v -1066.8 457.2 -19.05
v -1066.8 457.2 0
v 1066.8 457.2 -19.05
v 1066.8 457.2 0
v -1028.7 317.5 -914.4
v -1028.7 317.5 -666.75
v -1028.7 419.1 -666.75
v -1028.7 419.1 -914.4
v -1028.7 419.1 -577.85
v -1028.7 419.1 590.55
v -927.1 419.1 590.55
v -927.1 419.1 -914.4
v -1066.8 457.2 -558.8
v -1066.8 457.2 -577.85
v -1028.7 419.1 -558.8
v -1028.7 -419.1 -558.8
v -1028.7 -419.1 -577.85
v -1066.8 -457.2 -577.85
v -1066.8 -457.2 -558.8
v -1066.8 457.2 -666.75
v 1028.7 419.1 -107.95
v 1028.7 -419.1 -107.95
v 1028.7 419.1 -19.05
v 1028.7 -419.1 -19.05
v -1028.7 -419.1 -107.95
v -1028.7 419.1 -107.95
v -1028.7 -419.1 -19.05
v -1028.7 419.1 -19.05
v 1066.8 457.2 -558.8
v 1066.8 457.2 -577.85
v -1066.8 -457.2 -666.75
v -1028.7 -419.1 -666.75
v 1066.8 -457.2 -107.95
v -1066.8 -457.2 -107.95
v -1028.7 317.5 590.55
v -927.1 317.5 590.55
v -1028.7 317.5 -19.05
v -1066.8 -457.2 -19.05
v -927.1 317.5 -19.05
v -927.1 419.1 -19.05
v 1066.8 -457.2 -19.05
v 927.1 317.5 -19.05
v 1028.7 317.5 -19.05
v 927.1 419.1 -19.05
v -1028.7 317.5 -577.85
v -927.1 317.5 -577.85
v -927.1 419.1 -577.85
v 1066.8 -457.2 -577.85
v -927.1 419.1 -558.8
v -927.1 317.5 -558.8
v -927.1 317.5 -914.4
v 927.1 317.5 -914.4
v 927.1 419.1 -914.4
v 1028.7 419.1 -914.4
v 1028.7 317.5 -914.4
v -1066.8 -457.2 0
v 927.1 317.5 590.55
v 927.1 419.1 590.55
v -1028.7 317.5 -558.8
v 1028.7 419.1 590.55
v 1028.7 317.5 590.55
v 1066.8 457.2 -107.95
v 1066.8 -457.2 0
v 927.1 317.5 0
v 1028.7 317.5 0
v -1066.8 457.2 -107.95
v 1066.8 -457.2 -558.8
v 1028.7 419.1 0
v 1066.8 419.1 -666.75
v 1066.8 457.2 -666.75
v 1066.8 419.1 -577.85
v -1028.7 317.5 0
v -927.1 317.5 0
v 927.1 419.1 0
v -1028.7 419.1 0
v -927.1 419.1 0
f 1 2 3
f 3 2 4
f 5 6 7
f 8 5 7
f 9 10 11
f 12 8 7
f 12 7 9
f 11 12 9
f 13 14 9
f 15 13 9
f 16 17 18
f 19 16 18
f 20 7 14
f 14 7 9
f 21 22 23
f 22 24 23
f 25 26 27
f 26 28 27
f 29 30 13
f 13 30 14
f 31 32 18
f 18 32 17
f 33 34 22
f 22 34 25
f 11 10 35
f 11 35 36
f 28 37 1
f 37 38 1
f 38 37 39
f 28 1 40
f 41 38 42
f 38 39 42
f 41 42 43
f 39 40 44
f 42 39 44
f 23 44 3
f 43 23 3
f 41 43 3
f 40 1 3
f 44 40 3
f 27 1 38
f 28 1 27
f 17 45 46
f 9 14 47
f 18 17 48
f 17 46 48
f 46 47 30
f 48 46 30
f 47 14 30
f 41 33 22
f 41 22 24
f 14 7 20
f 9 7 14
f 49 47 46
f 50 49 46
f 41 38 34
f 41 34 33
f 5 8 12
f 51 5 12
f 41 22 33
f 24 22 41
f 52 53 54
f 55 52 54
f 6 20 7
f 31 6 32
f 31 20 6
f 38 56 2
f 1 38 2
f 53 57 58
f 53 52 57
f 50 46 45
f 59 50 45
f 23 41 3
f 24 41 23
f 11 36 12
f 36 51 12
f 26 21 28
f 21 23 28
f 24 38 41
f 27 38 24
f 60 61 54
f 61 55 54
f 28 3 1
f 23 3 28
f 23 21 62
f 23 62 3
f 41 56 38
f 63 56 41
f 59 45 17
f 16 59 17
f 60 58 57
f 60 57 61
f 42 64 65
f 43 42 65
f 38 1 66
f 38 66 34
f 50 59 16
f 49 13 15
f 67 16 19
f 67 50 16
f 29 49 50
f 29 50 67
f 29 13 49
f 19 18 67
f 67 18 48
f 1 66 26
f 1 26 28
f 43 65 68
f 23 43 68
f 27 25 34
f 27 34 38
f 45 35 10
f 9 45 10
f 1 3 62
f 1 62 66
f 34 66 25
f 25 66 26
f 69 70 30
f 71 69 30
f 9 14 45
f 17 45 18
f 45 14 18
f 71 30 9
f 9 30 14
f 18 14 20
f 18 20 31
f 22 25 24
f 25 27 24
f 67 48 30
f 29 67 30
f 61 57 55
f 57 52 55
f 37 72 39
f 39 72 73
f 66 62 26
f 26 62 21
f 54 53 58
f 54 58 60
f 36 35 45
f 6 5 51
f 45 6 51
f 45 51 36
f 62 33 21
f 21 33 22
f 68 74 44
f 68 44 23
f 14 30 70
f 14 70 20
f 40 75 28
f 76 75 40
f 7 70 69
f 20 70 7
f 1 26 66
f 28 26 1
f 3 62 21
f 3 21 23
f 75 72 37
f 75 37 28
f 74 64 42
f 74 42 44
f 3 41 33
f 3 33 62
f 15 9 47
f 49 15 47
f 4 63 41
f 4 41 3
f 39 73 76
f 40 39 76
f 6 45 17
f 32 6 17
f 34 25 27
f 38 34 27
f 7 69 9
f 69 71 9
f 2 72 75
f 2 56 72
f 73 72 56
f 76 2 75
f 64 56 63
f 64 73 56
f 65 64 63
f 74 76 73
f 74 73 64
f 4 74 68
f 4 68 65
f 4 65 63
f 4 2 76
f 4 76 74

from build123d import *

# Parameters (mm, degrees)
F0_W           = 2133.6
F0_H           = 914.4
F0_W_2         = 101.6
F0_H_2         = 101.6
F1_DEPTH       = 19.05
F2_W           = 2133.6
F2_H           = 88.9
F3_DEPTH       = 38.1
F4_SIZE        = 38.09999
F5_SIZE        = 38.09999
F6_W           = 914.4
F6_H           = 88.9
F7_DEPTH       = 38.1
F8_SIZE        = 38.09999
F9_SIZE        = 38.09999
F10_W          = 2133.6
F10_H          = 88.9
F11_DEPTH      = 38.1
F12_SIZE       = 38.09999
F13_SIZE       = 38.09999
F14_W          = 914.4
F14_H          = 88.9
F15_DEPTH      = 38.1
F16_SIZE       = 38.09999
F17_DEPTH      = 914.4
F17_DEPTH_BACK = 590.55
F18_W          = 914.4
F18_H          = 88.9
F19_DEPTH      = 38.1
F20_SIZE       = 38.09999
F23_DEPTH      = 19.05
F21_W          = 2133.6
F21_H          = 88.9
F24_DEPTH      = 38.1
F25_SIZE       = 38.09999


# Not quite as in the source:
# - a fillet or chamfer is up to 0.001 mm smaller than in the source, because OpenCascade refuses the exact size


with BuildPart() as f1:
    # F0 (on Top) → F1 (new body)
    with BuildSketch(Plane.XY):
        Rectangle(F0_W, F0_H)
        with Locations((-977.9, 368.3)):
            Rectangle(F0_W_2, F0_H_2, mode=Mode.SUBTRACT)
        with Locations((977.9, 368.3)):
            Rectangle(F0_W_2, F0_H_2, mode=Mode.SUBTRACT)
    extrude(amount=-F1_DEPTH)


with BuildPart() as f3:
    # F2 (on face) → F3 (new body)
    with BuildSketch(Plane.XZ.offset(457.2)):
        with Locations((0, -63.5)):
            Rectangle(F2_W, F2_H)
    extrude(amount=-F3_DEPTH)

    # F4 (size 38.1 in the source; OpenCascade refuses exactly that, so slightly less here)
    f4_edges = [f3.edges().sort_by_distance(p)[0] for p in [
        (-1066.8, -419.1, -63.5),
    ]]
    chamfer(f4_edges, length=F4_SIZE)

    # F5 (size 38.1 in the source; OpenCascade refuses exactly that, so slightly less here)
    f5_edges = [f3.edges().sort_by_distance(p)[0] for p in [
        (1066.8, -419.1, -63.5),
    ]]
    chamfer(f5_edges, length=F5_SIZE)


with BuildPart() as f7:
    # F6 (on face) → F7 (new body)
    with BuildSketch(Plane.YZ.offset(1066.8)):
        with Locations((0, -63.5)):
            Rectangle(F6_W, F6_H)
    extrude(amount=-F7_DEPTH)

    # F8 (size 38.1 in the source; OpenCascade refuses exactly that, so slightly less here)
    f8_edges = [f7.edges().sort_by_distance(p)[0] for p in [
        (1028.7, -457.2, -63.5),
    ]]
    chamfer(f8_edges, length=F8_SIZE)

    # F9 (size 38.1 in the source; OpenCascade refuses exactly that, so slightly less here)
    f9_edges = [f7.edges().sort_by_distance(p)[0] for p in [
        (1028.7, 457.2, -63.5),
    ]]
    chamfer(f9_edges, length=F9_SIZE)


with BuildPart() as f11:
    # F10 (on face) → F11 (new body)
    with BuildSketch(Plane(origin=(0, 457.2, 0), x_dir=(-1, 0, 0), z_dir=(0, 1, 0))):
        with Locations((0, -63.5)):
            Rectangle(F10_W, F10_H)
    extrude(amount=-F11_DEPTH)

    # F12 (size 38.1 in the source; OpenCascade refuses exactly that, so slightly less here)
    f12_edges = [f11.edges().sort_by_distance(p)[0] for p in [
        (1066.8, 419.1, -63.5),
    ]]
    chamfer(f12_edges, length=F12_SIZE)

    # F13 (size 38.1 in the source; OpenCascade refuses exactly that, so slightly less here)
    f13_edges = [f11.edges().sort_by_distance(p)[0] for p in [
        (-1066.8, 419.1, -63.5),
    ]]
    chamfer(f13_edges, length=F13_SIZE)


with BuildPart() as f15:
    # F14 (on face) → F15 (new body)
    with BuildSketch(Plane(origin=(-1066.8, 0, 0), x_dir=(0, -1, 0), z_dir=(-1, 0, 0))):
        with Locations((0, -63.5)):
            Rectangle(F14_W, F14_H)
    extrude(amount=-F15_DEPTH)

    # F16 (size 38.1 in the source; OpenCascade refuses exactly that, so slightly less here)
    f16_edges = [f15.edges().sort_by_distance(p)[0] for p in [
        (-1028.7, 457.2, -63.5),
        (-1028.7, -457.2, -63.5),
    ]]
    chamfer(f16_edges, length=F16_SIZE)


with BuildPart() as f17:
    # F0 (on Top) → F17 (new body, two sides)
    with BuildSketch(Plane.XY) as f17_sk:
        with Locations((-977.9, 368.3)):
            Rectangle(F0_W_2, F0_H_2)
    extrude(amount=-F17_DEPTH)
    extrude(f17_sk.sketch, amount=F17_DEPTH_BACK)

    # F18 (on face) → F19 (join)
    with BuildSketch(Plane(origin=(-1066.8, 0, 0), x_dir=(0, -1, 0), z_dir=(-1, 0, 0))):
        with Locations((0, -622.3)):
            Rectangle(F18_W, F18_H)
    extrude(amount=-F19_DEPTH)

    # F20 (size 38.1 in the source; OpenCascade refuses exactly that, so slightly less here)
    f20_edges = [f17.edges().sort_by_distance(p)[0] for p in [
        (-1028.7, -457.2, -622.3),
        (-1028.7, 457.2, -622.3),
    ]]
    chamfer(f20_edges, length=F20_SIZE)


with BuildPart() as f17b:
    # F0 (on Top) → F17, piece 2 (new body, two sides)
    with BuildSketch(Plane.XY) as f17_2_sk:
        with Locations((977.9, 368.3)):
            Rectangle(F0_W_2, F0_H_2)
    extrude(amount=-F17_DEPTH)
    extrude(f17_2_sk.sketch, amount=F17_DEPTH_BACK)


with BuildPart() as f23:
    # F22 (on face) → F23 (new body)
    with BuildSketch(Plane.XY.offset(-577.85)):
        Polygon((1066.8, 457.2), (-1066.8, 457.2), (-1028.7, 419.1), (-927.1, 419.1), (-927.1, 317.5), (-1028.7, 317.5), (-1028.7, -419.1), (-1066.8, -457.2), (1066.8, -457.2), align=None)
    extrude(amount=F23_DEPTH)


with BuildPart() as f24:
    # F21 (on face) → F24 (new body)
    with BuildSketch(Plane(origin=(0, 457.2, 0), x_dir=(-1, 0, 0), z_dir=(0, 1, 0))):
        with Locations((0, -622.3)):
            Rectangle(F21_W, F21_H)
    extrude(amount=-F24_DEPTH)

    # F25 (size 38.1 in the source; OpenCascade refuses exactly that, so slightly less here)
    f25_edges = [f24.edges().sort_by_distance(p)[0] for p in [
        (-1066.8, 419.1, -622.3),
    ]]
    chamfer(f25_edges, length=F25_SIZE)


solid = Compound([f1.part, f3.part, f7.part, f11.part, f15.part, f17.part, f17b.part, f23.part, f24.part])
